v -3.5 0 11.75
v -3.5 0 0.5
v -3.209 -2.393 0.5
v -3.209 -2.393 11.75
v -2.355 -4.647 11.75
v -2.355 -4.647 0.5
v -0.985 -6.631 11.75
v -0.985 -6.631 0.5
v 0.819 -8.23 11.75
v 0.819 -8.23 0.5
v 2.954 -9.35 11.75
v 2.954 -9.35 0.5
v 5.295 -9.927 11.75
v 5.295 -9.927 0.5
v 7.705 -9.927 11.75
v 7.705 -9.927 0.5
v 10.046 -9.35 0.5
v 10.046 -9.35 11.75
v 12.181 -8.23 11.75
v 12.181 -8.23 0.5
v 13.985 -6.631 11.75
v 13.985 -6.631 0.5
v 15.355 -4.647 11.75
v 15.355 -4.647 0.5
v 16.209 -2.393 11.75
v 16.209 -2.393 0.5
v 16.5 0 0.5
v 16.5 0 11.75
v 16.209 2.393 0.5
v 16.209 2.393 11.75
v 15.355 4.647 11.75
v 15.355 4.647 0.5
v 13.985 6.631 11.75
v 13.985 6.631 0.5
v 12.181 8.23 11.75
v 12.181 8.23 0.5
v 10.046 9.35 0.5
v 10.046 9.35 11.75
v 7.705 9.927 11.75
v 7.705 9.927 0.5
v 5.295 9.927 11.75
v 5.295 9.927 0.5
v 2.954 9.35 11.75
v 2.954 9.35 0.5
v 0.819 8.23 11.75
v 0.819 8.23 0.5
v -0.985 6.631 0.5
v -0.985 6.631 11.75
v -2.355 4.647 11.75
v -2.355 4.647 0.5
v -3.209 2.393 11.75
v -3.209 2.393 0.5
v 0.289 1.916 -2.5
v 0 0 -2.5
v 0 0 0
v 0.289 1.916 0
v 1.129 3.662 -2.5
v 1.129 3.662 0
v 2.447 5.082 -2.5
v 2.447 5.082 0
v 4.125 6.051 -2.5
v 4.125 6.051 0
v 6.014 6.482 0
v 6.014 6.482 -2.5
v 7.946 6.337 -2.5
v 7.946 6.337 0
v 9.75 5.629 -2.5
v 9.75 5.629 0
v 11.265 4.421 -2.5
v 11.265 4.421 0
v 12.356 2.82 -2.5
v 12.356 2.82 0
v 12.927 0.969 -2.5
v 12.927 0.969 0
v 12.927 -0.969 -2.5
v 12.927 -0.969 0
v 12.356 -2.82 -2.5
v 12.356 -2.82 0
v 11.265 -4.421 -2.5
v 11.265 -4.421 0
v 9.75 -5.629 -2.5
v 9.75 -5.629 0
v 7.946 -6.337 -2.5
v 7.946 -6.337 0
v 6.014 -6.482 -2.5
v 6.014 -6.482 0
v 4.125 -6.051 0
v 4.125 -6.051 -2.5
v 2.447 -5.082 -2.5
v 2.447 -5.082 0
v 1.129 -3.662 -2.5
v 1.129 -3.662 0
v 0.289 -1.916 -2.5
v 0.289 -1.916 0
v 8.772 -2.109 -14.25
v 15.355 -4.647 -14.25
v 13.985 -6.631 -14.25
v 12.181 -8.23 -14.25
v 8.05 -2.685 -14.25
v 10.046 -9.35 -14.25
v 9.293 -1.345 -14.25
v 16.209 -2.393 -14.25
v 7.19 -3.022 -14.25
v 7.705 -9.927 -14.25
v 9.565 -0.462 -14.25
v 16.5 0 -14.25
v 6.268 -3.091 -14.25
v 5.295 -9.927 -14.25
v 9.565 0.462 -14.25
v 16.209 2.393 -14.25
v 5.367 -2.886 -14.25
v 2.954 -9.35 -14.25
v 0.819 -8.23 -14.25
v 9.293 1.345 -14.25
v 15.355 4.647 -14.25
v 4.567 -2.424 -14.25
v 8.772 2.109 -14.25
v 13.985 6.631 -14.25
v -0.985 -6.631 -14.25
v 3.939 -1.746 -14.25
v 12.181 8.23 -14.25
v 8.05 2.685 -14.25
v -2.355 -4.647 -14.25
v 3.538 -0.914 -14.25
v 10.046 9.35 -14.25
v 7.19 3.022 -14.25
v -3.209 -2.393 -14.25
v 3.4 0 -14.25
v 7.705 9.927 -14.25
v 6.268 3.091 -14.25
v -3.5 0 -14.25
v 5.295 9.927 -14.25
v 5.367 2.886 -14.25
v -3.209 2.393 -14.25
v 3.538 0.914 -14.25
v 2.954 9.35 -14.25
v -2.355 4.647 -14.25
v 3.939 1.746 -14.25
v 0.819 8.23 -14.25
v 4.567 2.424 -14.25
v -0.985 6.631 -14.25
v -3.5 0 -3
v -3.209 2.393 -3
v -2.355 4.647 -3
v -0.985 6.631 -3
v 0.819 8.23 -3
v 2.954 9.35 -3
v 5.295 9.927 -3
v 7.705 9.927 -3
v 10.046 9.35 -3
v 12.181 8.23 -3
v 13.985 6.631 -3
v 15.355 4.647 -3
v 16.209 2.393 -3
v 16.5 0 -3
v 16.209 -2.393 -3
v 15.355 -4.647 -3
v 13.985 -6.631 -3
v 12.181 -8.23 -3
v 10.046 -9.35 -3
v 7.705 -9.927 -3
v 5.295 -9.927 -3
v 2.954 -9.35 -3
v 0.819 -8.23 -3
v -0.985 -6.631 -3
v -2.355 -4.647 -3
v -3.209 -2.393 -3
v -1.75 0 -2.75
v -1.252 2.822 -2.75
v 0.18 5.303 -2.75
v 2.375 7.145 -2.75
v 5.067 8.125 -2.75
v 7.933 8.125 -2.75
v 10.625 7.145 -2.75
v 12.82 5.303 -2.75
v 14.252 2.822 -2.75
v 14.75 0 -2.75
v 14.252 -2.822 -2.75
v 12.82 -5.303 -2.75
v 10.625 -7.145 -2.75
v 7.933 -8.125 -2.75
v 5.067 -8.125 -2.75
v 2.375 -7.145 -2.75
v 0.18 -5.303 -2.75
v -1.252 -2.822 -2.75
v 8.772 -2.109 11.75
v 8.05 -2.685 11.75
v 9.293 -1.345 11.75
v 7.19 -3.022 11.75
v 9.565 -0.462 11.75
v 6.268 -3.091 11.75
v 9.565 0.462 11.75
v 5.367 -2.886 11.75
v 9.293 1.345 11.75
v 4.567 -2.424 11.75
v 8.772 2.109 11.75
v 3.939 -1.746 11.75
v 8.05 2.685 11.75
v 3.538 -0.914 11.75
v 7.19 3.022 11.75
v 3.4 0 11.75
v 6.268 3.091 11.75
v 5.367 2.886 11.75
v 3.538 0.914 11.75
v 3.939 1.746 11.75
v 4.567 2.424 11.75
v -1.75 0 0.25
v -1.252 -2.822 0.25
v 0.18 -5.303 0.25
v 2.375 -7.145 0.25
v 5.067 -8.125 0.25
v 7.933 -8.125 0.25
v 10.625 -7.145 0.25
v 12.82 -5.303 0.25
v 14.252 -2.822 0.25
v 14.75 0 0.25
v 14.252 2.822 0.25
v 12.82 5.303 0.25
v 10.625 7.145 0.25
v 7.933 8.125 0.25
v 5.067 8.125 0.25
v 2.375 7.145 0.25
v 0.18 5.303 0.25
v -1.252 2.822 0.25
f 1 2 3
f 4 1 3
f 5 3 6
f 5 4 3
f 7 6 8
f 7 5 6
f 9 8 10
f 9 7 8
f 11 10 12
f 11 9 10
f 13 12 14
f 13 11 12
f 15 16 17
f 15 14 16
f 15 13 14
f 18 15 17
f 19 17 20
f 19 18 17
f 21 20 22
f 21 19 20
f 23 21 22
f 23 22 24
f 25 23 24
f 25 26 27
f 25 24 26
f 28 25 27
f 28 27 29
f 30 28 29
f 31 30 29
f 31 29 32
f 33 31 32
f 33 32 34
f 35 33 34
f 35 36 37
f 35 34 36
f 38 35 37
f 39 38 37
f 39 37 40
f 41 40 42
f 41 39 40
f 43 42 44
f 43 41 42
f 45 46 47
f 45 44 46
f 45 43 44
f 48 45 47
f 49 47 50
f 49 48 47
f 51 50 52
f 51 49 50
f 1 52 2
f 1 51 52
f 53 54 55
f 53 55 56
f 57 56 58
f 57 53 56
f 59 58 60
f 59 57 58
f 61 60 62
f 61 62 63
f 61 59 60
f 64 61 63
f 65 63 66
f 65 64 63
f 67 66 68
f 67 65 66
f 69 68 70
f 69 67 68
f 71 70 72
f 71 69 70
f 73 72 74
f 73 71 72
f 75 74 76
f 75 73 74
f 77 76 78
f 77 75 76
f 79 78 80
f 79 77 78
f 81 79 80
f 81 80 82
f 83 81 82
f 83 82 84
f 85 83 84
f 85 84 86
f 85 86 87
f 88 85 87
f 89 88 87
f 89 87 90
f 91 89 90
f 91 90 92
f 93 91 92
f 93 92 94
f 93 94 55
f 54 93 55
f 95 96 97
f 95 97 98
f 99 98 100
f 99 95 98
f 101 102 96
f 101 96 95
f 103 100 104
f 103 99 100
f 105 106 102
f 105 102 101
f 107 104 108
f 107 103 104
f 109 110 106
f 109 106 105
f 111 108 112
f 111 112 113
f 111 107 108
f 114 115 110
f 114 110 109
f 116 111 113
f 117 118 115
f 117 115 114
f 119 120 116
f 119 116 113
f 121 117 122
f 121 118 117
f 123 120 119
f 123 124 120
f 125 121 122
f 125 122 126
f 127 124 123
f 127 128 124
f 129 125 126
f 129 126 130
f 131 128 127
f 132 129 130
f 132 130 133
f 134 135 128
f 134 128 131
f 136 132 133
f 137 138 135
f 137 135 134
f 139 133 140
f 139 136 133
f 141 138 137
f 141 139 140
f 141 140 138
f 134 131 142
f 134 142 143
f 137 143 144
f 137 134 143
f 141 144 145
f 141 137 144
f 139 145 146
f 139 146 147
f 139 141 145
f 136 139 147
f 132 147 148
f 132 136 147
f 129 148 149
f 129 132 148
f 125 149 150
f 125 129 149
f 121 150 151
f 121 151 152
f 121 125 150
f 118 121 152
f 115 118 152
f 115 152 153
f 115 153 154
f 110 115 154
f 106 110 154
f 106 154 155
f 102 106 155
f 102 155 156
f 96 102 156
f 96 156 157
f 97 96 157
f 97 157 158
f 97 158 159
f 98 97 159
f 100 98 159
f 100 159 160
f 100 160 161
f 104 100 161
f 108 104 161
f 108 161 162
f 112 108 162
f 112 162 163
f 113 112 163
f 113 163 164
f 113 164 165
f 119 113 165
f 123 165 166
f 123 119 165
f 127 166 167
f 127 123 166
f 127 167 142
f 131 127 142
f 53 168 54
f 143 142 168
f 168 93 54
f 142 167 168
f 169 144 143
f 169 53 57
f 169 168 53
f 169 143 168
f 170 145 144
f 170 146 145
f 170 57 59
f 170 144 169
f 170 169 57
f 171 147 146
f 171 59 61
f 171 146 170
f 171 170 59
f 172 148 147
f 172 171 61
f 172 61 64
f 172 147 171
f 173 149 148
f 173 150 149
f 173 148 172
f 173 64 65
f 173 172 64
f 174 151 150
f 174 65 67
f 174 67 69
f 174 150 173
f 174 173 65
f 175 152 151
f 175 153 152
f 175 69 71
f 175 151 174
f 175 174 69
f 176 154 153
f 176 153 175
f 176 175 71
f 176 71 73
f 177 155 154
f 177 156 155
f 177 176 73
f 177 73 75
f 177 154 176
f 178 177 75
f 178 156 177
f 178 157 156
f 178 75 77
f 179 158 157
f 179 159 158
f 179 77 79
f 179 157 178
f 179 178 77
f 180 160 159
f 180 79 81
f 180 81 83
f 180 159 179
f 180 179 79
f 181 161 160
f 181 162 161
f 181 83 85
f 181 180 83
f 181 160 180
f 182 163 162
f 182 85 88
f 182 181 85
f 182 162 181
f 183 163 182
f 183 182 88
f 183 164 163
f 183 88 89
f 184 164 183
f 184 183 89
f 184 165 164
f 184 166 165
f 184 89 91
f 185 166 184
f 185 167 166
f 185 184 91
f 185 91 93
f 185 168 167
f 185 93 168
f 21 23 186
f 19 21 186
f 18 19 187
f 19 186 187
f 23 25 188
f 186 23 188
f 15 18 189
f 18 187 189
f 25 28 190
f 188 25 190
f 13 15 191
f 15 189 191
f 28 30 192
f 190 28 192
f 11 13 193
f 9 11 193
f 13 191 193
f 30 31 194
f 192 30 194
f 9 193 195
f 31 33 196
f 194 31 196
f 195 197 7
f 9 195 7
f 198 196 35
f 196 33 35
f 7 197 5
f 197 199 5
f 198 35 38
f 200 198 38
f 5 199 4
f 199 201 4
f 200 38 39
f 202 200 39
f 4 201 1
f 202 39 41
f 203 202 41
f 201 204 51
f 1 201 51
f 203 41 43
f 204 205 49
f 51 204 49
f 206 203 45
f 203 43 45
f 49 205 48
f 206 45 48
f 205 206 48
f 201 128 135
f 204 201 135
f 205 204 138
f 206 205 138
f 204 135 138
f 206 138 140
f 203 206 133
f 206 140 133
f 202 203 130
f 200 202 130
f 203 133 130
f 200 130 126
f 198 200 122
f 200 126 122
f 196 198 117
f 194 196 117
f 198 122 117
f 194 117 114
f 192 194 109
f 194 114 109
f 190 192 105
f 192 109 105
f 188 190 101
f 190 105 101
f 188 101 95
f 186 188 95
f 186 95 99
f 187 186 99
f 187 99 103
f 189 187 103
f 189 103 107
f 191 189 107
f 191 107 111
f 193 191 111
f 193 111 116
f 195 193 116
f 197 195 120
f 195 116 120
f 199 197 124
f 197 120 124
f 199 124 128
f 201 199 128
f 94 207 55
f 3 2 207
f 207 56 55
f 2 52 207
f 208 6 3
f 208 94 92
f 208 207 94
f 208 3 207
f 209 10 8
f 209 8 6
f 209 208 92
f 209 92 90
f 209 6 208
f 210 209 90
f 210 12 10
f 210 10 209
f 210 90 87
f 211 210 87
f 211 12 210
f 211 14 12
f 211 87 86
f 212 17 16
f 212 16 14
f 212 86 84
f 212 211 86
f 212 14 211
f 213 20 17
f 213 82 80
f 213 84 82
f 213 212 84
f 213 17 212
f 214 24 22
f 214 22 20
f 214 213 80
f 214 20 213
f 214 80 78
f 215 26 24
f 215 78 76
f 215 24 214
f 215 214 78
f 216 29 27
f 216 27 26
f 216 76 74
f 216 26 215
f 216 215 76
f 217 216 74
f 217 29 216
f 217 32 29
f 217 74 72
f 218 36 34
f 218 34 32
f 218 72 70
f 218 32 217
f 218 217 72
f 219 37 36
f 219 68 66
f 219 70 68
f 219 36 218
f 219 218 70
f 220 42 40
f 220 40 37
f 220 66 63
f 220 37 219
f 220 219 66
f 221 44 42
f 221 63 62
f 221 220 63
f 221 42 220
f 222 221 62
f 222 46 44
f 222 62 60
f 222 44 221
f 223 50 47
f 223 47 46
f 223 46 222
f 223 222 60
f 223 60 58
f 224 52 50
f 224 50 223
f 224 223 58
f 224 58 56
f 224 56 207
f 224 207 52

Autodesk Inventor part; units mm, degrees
ref_plane "YZ Plane" through (0, 0, 0) normal (1, 0, 0) x (0, 1, 0)
ref_plane "XZ Plane" through (0, 0, 0) normal (0, 1, 0) x (-1, 0, 0)
ref_plane "XY Plane" through (0, 0, 0) normal (0, 0, 1) x (1, 0, 0)
sketch "Sketch1" plane through (0, 0, 0) normal (0, 1, 0) x (-1, 0, 0)
  line L0 (0, 0) -> (0, -2.5)
  line L1 (3.5, 0.5) -> (0, 0)
  line L2 (3.5, -3) -> (0, -2.5)
  line L3 (3.5, -3) -> (3.5, -14.25)
  line L4 (3.5, -14.25) -> (-6.5, -14.25)
  line L5 (3.5, 0.5) -> (3.5, 11.75)
  line L6 (3.5, 11.75) -> (-6.5, 11.75)
  line L7 (-6.5, 11.75) -> (-6.5, -14.25)
  dimension "d0" = 2.5
  dimension "d6" = 3.5
  dimension "d9" = 11.25
  dimension "d11" = 10
  dimension "d12" = 90
  dimension "d13" = 11.25
  dimension "d15" = 10
  dimension "d16" = 90
  dimension "d17" = 3.5
  dimension "d18" = 11.75
revolve "Revolution1" add sketch "Sketch1" angle 360 about axis through (6.5, 0, 11.75) along (0, 0, -1)
sketch "Sketch2" plane through (6.5, 0, -14.25) normal (0, 0, -1) x (-1, 0, 0)
  circle A0 centre (0, 0) radius 3.1
  circle A1 centre (0, 0) radius 10 projected
  point P0 (6.5, 0)
  dimension "d20" = 6.2
extrude "Extrusion1" cut sketch "Sketch2" against normal blind 26 contours A0
properties part number "roller" material "ABS Plastic"
